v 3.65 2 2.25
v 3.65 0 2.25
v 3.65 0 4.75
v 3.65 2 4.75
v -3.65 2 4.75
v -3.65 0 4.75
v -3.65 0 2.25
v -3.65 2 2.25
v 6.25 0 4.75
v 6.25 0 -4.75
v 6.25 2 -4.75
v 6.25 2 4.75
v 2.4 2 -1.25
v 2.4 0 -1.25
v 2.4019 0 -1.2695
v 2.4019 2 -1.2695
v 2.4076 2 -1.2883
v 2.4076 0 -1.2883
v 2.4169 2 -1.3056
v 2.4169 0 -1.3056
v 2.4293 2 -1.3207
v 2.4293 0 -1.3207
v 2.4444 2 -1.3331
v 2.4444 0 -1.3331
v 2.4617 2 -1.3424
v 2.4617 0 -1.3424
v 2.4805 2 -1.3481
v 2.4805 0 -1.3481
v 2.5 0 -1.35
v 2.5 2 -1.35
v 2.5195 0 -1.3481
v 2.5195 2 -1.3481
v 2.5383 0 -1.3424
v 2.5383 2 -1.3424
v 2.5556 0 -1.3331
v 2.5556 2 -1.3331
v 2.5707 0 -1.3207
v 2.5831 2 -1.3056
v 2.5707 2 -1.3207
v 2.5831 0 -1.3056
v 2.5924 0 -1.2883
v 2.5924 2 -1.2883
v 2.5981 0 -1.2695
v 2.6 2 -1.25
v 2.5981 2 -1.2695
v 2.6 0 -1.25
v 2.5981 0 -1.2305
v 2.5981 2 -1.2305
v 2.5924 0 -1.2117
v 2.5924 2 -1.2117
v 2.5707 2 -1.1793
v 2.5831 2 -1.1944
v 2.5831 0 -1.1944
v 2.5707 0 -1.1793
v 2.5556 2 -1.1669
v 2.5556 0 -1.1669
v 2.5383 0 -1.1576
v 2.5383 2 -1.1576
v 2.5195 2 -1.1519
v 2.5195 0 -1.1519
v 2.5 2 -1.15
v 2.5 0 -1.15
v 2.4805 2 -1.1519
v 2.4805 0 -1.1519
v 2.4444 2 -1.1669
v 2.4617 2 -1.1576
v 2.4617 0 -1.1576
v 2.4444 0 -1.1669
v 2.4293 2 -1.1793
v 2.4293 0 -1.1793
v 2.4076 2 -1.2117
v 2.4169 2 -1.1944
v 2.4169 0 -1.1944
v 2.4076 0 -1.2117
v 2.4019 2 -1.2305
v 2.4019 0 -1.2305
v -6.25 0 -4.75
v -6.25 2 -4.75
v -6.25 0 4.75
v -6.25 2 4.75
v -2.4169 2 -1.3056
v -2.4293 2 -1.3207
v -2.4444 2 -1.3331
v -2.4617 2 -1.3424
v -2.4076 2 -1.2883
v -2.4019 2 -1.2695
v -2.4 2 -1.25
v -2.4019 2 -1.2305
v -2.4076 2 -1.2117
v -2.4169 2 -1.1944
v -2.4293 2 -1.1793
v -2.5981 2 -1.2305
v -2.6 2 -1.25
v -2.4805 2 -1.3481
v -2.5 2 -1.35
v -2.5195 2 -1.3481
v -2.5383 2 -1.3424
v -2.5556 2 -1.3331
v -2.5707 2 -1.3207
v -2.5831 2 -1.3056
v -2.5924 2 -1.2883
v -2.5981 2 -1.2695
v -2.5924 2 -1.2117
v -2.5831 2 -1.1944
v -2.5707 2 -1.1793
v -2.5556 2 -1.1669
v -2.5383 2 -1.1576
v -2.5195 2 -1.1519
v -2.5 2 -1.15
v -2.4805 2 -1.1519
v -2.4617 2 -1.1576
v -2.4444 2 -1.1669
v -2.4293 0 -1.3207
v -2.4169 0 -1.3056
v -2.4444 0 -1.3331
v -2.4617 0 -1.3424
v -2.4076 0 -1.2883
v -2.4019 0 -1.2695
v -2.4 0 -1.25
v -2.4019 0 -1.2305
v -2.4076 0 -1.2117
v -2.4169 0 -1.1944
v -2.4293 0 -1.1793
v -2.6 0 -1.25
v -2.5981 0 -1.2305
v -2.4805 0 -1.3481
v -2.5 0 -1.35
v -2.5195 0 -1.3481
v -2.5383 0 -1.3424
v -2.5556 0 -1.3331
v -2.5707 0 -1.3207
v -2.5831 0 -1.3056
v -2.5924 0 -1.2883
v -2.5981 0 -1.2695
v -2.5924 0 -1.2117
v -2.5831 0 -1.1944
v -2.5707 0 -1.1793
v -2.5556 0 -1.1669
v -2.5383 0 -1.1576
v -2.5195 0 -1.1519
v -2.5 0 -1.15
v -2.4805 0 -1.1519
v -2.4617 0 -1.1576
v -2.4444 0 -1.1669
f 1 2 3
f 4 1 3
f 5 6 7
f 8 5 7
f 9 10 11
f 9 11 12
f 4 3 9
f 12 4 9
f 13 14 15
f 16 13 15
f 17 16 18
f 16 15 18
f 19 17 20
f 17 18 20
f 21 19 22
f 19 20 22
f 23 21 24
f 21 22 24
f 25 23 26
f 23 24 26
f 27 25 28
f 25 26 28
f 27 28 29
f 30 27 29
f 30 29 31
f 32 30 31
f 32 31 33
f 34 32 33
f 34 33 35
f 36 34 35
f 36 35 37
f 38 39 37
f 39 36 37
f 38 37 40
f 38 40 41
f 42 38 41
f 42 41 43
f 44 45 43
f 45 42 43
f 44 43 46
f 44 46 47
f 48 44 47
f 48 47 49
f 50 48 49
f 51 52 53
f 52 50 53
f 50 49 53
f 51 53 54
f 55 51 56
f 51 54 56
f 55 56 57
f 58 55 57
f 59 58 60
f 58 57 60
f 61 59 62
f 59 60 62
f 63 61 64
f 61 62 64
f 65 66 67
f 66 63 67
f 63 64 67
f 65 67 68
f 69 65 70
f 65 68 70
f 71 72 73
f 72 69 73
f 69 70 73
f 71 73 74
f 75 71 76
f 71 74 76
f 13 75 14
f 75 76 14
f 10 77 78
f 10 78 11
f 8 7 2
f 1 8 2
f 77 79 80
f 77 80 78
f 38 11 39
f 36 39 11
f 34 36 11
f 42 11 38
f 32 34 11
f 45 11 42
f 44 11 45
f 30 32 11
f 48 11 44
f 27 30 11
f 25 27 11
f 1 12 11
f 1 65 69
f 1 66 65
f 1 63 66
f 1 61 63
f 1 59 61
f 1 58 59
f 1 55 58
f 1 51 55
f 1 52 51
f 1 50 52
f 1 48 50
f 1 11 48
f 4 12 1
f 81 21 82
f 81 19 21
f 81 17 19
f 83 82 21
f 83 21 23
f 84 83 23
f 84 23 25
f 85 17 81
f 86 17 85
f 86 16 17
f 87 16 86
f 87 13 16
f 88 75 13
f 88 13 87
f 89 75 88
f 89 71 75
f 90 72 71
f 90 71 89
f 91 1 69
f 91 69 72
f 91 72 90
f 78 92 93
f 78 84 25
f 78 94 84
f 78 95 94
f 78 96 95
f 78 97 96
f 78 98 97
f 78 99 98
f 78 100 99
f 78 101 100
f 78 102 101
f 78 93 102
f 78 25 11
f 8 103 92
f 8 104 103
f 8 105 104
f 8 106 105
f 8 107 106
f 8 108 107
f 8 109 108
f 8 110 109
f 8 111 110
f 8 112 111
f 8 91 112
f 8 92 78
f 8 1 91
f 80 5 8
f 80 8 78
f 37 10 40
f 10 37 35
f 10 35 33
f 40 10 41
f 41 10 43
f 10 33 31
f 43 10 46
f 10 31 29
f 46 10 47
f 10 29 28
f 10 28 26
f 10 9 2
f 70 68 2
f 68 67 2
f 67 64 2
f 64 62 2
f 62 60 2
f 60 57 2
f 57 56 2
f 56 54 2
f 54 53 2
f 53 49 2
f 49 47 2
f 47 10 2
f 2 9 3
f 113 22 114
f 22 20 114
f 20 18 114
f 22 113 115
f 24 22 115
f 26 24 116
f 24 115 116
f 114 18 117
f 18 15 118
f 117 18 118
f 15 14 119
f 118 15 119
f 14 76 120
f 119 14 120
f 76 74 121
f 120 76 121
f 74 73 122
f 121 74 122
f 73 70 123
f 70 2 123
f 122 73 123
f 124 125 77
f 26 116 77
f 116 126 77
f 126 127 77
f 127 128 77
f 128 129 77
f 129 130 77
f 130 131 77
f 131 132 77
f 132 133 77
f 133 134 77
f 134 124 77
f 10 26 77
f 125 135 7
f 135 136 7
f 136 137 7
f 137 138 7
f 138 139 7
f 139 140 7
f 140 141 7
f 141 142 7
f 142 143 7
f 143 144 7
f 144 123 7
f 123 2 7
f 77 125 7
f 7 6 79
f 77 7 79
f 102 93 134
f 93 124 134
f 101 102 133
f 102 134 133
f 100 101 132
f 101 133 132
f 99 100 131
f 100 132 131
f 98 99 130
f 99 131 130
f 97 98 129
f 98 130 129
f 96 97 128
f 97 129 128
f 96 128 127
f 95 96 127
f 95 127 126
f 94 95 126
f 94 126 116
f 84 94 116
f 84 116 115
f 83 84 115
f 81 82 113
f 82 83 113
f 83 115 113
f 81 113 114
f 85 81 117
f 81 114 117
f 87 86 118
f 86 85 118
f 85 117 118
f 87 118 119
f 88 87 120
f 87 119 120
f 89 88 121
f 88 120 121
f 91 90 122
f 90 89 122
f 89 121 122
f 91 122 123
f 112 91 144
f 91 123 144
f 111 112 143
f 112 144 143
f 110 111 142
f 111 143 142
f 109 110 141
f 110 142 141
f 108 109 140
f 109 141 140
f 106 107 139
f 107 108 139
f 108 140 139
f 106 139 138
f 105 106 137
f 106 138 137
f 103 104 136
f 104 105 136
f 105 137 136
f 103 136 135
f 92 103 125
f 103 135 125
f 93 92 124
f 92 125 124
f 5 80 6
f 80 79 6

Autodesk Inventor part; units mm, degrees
ref_plane "YZ Plane" through (0, 0, 0) normal (1, 0, 0) x (0, 1, 0)
ref_plane "XZ Plane" through (0, 0, 0) normal (0, 1, 0) x (-1, 0, 0)
ref_plane "XY Plane" through (0, 0, 0) normal (0, 0, 1) x (1, 0, 0)
sketch "Sketch1" plane through (0, 0, 0) normal (0, 1, 0) x (-1, 0, 0)
  line L0 (6.25, 4.75) -> (3.65, 4.75)
  line L1 (-3.65, 4.75) -> (-6.25, 4.75)
  line L2 (6.25, 4.75) -> (6.25, -4.75)
  line L3 (6.25, -4.75) -> (-6.25, -4.75)
  line L4 (-6.25, -4.75) -> (-6.25, 4.75)
  circle A0 centre (2.5, -1.25) radius 0.1
  circle A1 centre (-2.5, -1.25) radius 0.1
  line L5 (3.65, 4.75) -> (3.65, 2.25)
  line L6 (3.65, 2.25) -> (-3.65, 2.25)
  line L7 (-3.65, 2.25) -> (-3.65, 4.75)
  dimension "d0" = 12.5
  dimension "d1" = 9.5
  dimension "d2" = 2.6
  dimension "d7" = 0.2
  dimension "d9" = 0.2
  dimension "d17" = 2.6
  dimension "d18" = 2.5
  dimension "d19" = 7.3
extrude "Extrusion1" add sketch "Sketch1" along normal blind 2
properties part number "PCB_kon_drzak"
